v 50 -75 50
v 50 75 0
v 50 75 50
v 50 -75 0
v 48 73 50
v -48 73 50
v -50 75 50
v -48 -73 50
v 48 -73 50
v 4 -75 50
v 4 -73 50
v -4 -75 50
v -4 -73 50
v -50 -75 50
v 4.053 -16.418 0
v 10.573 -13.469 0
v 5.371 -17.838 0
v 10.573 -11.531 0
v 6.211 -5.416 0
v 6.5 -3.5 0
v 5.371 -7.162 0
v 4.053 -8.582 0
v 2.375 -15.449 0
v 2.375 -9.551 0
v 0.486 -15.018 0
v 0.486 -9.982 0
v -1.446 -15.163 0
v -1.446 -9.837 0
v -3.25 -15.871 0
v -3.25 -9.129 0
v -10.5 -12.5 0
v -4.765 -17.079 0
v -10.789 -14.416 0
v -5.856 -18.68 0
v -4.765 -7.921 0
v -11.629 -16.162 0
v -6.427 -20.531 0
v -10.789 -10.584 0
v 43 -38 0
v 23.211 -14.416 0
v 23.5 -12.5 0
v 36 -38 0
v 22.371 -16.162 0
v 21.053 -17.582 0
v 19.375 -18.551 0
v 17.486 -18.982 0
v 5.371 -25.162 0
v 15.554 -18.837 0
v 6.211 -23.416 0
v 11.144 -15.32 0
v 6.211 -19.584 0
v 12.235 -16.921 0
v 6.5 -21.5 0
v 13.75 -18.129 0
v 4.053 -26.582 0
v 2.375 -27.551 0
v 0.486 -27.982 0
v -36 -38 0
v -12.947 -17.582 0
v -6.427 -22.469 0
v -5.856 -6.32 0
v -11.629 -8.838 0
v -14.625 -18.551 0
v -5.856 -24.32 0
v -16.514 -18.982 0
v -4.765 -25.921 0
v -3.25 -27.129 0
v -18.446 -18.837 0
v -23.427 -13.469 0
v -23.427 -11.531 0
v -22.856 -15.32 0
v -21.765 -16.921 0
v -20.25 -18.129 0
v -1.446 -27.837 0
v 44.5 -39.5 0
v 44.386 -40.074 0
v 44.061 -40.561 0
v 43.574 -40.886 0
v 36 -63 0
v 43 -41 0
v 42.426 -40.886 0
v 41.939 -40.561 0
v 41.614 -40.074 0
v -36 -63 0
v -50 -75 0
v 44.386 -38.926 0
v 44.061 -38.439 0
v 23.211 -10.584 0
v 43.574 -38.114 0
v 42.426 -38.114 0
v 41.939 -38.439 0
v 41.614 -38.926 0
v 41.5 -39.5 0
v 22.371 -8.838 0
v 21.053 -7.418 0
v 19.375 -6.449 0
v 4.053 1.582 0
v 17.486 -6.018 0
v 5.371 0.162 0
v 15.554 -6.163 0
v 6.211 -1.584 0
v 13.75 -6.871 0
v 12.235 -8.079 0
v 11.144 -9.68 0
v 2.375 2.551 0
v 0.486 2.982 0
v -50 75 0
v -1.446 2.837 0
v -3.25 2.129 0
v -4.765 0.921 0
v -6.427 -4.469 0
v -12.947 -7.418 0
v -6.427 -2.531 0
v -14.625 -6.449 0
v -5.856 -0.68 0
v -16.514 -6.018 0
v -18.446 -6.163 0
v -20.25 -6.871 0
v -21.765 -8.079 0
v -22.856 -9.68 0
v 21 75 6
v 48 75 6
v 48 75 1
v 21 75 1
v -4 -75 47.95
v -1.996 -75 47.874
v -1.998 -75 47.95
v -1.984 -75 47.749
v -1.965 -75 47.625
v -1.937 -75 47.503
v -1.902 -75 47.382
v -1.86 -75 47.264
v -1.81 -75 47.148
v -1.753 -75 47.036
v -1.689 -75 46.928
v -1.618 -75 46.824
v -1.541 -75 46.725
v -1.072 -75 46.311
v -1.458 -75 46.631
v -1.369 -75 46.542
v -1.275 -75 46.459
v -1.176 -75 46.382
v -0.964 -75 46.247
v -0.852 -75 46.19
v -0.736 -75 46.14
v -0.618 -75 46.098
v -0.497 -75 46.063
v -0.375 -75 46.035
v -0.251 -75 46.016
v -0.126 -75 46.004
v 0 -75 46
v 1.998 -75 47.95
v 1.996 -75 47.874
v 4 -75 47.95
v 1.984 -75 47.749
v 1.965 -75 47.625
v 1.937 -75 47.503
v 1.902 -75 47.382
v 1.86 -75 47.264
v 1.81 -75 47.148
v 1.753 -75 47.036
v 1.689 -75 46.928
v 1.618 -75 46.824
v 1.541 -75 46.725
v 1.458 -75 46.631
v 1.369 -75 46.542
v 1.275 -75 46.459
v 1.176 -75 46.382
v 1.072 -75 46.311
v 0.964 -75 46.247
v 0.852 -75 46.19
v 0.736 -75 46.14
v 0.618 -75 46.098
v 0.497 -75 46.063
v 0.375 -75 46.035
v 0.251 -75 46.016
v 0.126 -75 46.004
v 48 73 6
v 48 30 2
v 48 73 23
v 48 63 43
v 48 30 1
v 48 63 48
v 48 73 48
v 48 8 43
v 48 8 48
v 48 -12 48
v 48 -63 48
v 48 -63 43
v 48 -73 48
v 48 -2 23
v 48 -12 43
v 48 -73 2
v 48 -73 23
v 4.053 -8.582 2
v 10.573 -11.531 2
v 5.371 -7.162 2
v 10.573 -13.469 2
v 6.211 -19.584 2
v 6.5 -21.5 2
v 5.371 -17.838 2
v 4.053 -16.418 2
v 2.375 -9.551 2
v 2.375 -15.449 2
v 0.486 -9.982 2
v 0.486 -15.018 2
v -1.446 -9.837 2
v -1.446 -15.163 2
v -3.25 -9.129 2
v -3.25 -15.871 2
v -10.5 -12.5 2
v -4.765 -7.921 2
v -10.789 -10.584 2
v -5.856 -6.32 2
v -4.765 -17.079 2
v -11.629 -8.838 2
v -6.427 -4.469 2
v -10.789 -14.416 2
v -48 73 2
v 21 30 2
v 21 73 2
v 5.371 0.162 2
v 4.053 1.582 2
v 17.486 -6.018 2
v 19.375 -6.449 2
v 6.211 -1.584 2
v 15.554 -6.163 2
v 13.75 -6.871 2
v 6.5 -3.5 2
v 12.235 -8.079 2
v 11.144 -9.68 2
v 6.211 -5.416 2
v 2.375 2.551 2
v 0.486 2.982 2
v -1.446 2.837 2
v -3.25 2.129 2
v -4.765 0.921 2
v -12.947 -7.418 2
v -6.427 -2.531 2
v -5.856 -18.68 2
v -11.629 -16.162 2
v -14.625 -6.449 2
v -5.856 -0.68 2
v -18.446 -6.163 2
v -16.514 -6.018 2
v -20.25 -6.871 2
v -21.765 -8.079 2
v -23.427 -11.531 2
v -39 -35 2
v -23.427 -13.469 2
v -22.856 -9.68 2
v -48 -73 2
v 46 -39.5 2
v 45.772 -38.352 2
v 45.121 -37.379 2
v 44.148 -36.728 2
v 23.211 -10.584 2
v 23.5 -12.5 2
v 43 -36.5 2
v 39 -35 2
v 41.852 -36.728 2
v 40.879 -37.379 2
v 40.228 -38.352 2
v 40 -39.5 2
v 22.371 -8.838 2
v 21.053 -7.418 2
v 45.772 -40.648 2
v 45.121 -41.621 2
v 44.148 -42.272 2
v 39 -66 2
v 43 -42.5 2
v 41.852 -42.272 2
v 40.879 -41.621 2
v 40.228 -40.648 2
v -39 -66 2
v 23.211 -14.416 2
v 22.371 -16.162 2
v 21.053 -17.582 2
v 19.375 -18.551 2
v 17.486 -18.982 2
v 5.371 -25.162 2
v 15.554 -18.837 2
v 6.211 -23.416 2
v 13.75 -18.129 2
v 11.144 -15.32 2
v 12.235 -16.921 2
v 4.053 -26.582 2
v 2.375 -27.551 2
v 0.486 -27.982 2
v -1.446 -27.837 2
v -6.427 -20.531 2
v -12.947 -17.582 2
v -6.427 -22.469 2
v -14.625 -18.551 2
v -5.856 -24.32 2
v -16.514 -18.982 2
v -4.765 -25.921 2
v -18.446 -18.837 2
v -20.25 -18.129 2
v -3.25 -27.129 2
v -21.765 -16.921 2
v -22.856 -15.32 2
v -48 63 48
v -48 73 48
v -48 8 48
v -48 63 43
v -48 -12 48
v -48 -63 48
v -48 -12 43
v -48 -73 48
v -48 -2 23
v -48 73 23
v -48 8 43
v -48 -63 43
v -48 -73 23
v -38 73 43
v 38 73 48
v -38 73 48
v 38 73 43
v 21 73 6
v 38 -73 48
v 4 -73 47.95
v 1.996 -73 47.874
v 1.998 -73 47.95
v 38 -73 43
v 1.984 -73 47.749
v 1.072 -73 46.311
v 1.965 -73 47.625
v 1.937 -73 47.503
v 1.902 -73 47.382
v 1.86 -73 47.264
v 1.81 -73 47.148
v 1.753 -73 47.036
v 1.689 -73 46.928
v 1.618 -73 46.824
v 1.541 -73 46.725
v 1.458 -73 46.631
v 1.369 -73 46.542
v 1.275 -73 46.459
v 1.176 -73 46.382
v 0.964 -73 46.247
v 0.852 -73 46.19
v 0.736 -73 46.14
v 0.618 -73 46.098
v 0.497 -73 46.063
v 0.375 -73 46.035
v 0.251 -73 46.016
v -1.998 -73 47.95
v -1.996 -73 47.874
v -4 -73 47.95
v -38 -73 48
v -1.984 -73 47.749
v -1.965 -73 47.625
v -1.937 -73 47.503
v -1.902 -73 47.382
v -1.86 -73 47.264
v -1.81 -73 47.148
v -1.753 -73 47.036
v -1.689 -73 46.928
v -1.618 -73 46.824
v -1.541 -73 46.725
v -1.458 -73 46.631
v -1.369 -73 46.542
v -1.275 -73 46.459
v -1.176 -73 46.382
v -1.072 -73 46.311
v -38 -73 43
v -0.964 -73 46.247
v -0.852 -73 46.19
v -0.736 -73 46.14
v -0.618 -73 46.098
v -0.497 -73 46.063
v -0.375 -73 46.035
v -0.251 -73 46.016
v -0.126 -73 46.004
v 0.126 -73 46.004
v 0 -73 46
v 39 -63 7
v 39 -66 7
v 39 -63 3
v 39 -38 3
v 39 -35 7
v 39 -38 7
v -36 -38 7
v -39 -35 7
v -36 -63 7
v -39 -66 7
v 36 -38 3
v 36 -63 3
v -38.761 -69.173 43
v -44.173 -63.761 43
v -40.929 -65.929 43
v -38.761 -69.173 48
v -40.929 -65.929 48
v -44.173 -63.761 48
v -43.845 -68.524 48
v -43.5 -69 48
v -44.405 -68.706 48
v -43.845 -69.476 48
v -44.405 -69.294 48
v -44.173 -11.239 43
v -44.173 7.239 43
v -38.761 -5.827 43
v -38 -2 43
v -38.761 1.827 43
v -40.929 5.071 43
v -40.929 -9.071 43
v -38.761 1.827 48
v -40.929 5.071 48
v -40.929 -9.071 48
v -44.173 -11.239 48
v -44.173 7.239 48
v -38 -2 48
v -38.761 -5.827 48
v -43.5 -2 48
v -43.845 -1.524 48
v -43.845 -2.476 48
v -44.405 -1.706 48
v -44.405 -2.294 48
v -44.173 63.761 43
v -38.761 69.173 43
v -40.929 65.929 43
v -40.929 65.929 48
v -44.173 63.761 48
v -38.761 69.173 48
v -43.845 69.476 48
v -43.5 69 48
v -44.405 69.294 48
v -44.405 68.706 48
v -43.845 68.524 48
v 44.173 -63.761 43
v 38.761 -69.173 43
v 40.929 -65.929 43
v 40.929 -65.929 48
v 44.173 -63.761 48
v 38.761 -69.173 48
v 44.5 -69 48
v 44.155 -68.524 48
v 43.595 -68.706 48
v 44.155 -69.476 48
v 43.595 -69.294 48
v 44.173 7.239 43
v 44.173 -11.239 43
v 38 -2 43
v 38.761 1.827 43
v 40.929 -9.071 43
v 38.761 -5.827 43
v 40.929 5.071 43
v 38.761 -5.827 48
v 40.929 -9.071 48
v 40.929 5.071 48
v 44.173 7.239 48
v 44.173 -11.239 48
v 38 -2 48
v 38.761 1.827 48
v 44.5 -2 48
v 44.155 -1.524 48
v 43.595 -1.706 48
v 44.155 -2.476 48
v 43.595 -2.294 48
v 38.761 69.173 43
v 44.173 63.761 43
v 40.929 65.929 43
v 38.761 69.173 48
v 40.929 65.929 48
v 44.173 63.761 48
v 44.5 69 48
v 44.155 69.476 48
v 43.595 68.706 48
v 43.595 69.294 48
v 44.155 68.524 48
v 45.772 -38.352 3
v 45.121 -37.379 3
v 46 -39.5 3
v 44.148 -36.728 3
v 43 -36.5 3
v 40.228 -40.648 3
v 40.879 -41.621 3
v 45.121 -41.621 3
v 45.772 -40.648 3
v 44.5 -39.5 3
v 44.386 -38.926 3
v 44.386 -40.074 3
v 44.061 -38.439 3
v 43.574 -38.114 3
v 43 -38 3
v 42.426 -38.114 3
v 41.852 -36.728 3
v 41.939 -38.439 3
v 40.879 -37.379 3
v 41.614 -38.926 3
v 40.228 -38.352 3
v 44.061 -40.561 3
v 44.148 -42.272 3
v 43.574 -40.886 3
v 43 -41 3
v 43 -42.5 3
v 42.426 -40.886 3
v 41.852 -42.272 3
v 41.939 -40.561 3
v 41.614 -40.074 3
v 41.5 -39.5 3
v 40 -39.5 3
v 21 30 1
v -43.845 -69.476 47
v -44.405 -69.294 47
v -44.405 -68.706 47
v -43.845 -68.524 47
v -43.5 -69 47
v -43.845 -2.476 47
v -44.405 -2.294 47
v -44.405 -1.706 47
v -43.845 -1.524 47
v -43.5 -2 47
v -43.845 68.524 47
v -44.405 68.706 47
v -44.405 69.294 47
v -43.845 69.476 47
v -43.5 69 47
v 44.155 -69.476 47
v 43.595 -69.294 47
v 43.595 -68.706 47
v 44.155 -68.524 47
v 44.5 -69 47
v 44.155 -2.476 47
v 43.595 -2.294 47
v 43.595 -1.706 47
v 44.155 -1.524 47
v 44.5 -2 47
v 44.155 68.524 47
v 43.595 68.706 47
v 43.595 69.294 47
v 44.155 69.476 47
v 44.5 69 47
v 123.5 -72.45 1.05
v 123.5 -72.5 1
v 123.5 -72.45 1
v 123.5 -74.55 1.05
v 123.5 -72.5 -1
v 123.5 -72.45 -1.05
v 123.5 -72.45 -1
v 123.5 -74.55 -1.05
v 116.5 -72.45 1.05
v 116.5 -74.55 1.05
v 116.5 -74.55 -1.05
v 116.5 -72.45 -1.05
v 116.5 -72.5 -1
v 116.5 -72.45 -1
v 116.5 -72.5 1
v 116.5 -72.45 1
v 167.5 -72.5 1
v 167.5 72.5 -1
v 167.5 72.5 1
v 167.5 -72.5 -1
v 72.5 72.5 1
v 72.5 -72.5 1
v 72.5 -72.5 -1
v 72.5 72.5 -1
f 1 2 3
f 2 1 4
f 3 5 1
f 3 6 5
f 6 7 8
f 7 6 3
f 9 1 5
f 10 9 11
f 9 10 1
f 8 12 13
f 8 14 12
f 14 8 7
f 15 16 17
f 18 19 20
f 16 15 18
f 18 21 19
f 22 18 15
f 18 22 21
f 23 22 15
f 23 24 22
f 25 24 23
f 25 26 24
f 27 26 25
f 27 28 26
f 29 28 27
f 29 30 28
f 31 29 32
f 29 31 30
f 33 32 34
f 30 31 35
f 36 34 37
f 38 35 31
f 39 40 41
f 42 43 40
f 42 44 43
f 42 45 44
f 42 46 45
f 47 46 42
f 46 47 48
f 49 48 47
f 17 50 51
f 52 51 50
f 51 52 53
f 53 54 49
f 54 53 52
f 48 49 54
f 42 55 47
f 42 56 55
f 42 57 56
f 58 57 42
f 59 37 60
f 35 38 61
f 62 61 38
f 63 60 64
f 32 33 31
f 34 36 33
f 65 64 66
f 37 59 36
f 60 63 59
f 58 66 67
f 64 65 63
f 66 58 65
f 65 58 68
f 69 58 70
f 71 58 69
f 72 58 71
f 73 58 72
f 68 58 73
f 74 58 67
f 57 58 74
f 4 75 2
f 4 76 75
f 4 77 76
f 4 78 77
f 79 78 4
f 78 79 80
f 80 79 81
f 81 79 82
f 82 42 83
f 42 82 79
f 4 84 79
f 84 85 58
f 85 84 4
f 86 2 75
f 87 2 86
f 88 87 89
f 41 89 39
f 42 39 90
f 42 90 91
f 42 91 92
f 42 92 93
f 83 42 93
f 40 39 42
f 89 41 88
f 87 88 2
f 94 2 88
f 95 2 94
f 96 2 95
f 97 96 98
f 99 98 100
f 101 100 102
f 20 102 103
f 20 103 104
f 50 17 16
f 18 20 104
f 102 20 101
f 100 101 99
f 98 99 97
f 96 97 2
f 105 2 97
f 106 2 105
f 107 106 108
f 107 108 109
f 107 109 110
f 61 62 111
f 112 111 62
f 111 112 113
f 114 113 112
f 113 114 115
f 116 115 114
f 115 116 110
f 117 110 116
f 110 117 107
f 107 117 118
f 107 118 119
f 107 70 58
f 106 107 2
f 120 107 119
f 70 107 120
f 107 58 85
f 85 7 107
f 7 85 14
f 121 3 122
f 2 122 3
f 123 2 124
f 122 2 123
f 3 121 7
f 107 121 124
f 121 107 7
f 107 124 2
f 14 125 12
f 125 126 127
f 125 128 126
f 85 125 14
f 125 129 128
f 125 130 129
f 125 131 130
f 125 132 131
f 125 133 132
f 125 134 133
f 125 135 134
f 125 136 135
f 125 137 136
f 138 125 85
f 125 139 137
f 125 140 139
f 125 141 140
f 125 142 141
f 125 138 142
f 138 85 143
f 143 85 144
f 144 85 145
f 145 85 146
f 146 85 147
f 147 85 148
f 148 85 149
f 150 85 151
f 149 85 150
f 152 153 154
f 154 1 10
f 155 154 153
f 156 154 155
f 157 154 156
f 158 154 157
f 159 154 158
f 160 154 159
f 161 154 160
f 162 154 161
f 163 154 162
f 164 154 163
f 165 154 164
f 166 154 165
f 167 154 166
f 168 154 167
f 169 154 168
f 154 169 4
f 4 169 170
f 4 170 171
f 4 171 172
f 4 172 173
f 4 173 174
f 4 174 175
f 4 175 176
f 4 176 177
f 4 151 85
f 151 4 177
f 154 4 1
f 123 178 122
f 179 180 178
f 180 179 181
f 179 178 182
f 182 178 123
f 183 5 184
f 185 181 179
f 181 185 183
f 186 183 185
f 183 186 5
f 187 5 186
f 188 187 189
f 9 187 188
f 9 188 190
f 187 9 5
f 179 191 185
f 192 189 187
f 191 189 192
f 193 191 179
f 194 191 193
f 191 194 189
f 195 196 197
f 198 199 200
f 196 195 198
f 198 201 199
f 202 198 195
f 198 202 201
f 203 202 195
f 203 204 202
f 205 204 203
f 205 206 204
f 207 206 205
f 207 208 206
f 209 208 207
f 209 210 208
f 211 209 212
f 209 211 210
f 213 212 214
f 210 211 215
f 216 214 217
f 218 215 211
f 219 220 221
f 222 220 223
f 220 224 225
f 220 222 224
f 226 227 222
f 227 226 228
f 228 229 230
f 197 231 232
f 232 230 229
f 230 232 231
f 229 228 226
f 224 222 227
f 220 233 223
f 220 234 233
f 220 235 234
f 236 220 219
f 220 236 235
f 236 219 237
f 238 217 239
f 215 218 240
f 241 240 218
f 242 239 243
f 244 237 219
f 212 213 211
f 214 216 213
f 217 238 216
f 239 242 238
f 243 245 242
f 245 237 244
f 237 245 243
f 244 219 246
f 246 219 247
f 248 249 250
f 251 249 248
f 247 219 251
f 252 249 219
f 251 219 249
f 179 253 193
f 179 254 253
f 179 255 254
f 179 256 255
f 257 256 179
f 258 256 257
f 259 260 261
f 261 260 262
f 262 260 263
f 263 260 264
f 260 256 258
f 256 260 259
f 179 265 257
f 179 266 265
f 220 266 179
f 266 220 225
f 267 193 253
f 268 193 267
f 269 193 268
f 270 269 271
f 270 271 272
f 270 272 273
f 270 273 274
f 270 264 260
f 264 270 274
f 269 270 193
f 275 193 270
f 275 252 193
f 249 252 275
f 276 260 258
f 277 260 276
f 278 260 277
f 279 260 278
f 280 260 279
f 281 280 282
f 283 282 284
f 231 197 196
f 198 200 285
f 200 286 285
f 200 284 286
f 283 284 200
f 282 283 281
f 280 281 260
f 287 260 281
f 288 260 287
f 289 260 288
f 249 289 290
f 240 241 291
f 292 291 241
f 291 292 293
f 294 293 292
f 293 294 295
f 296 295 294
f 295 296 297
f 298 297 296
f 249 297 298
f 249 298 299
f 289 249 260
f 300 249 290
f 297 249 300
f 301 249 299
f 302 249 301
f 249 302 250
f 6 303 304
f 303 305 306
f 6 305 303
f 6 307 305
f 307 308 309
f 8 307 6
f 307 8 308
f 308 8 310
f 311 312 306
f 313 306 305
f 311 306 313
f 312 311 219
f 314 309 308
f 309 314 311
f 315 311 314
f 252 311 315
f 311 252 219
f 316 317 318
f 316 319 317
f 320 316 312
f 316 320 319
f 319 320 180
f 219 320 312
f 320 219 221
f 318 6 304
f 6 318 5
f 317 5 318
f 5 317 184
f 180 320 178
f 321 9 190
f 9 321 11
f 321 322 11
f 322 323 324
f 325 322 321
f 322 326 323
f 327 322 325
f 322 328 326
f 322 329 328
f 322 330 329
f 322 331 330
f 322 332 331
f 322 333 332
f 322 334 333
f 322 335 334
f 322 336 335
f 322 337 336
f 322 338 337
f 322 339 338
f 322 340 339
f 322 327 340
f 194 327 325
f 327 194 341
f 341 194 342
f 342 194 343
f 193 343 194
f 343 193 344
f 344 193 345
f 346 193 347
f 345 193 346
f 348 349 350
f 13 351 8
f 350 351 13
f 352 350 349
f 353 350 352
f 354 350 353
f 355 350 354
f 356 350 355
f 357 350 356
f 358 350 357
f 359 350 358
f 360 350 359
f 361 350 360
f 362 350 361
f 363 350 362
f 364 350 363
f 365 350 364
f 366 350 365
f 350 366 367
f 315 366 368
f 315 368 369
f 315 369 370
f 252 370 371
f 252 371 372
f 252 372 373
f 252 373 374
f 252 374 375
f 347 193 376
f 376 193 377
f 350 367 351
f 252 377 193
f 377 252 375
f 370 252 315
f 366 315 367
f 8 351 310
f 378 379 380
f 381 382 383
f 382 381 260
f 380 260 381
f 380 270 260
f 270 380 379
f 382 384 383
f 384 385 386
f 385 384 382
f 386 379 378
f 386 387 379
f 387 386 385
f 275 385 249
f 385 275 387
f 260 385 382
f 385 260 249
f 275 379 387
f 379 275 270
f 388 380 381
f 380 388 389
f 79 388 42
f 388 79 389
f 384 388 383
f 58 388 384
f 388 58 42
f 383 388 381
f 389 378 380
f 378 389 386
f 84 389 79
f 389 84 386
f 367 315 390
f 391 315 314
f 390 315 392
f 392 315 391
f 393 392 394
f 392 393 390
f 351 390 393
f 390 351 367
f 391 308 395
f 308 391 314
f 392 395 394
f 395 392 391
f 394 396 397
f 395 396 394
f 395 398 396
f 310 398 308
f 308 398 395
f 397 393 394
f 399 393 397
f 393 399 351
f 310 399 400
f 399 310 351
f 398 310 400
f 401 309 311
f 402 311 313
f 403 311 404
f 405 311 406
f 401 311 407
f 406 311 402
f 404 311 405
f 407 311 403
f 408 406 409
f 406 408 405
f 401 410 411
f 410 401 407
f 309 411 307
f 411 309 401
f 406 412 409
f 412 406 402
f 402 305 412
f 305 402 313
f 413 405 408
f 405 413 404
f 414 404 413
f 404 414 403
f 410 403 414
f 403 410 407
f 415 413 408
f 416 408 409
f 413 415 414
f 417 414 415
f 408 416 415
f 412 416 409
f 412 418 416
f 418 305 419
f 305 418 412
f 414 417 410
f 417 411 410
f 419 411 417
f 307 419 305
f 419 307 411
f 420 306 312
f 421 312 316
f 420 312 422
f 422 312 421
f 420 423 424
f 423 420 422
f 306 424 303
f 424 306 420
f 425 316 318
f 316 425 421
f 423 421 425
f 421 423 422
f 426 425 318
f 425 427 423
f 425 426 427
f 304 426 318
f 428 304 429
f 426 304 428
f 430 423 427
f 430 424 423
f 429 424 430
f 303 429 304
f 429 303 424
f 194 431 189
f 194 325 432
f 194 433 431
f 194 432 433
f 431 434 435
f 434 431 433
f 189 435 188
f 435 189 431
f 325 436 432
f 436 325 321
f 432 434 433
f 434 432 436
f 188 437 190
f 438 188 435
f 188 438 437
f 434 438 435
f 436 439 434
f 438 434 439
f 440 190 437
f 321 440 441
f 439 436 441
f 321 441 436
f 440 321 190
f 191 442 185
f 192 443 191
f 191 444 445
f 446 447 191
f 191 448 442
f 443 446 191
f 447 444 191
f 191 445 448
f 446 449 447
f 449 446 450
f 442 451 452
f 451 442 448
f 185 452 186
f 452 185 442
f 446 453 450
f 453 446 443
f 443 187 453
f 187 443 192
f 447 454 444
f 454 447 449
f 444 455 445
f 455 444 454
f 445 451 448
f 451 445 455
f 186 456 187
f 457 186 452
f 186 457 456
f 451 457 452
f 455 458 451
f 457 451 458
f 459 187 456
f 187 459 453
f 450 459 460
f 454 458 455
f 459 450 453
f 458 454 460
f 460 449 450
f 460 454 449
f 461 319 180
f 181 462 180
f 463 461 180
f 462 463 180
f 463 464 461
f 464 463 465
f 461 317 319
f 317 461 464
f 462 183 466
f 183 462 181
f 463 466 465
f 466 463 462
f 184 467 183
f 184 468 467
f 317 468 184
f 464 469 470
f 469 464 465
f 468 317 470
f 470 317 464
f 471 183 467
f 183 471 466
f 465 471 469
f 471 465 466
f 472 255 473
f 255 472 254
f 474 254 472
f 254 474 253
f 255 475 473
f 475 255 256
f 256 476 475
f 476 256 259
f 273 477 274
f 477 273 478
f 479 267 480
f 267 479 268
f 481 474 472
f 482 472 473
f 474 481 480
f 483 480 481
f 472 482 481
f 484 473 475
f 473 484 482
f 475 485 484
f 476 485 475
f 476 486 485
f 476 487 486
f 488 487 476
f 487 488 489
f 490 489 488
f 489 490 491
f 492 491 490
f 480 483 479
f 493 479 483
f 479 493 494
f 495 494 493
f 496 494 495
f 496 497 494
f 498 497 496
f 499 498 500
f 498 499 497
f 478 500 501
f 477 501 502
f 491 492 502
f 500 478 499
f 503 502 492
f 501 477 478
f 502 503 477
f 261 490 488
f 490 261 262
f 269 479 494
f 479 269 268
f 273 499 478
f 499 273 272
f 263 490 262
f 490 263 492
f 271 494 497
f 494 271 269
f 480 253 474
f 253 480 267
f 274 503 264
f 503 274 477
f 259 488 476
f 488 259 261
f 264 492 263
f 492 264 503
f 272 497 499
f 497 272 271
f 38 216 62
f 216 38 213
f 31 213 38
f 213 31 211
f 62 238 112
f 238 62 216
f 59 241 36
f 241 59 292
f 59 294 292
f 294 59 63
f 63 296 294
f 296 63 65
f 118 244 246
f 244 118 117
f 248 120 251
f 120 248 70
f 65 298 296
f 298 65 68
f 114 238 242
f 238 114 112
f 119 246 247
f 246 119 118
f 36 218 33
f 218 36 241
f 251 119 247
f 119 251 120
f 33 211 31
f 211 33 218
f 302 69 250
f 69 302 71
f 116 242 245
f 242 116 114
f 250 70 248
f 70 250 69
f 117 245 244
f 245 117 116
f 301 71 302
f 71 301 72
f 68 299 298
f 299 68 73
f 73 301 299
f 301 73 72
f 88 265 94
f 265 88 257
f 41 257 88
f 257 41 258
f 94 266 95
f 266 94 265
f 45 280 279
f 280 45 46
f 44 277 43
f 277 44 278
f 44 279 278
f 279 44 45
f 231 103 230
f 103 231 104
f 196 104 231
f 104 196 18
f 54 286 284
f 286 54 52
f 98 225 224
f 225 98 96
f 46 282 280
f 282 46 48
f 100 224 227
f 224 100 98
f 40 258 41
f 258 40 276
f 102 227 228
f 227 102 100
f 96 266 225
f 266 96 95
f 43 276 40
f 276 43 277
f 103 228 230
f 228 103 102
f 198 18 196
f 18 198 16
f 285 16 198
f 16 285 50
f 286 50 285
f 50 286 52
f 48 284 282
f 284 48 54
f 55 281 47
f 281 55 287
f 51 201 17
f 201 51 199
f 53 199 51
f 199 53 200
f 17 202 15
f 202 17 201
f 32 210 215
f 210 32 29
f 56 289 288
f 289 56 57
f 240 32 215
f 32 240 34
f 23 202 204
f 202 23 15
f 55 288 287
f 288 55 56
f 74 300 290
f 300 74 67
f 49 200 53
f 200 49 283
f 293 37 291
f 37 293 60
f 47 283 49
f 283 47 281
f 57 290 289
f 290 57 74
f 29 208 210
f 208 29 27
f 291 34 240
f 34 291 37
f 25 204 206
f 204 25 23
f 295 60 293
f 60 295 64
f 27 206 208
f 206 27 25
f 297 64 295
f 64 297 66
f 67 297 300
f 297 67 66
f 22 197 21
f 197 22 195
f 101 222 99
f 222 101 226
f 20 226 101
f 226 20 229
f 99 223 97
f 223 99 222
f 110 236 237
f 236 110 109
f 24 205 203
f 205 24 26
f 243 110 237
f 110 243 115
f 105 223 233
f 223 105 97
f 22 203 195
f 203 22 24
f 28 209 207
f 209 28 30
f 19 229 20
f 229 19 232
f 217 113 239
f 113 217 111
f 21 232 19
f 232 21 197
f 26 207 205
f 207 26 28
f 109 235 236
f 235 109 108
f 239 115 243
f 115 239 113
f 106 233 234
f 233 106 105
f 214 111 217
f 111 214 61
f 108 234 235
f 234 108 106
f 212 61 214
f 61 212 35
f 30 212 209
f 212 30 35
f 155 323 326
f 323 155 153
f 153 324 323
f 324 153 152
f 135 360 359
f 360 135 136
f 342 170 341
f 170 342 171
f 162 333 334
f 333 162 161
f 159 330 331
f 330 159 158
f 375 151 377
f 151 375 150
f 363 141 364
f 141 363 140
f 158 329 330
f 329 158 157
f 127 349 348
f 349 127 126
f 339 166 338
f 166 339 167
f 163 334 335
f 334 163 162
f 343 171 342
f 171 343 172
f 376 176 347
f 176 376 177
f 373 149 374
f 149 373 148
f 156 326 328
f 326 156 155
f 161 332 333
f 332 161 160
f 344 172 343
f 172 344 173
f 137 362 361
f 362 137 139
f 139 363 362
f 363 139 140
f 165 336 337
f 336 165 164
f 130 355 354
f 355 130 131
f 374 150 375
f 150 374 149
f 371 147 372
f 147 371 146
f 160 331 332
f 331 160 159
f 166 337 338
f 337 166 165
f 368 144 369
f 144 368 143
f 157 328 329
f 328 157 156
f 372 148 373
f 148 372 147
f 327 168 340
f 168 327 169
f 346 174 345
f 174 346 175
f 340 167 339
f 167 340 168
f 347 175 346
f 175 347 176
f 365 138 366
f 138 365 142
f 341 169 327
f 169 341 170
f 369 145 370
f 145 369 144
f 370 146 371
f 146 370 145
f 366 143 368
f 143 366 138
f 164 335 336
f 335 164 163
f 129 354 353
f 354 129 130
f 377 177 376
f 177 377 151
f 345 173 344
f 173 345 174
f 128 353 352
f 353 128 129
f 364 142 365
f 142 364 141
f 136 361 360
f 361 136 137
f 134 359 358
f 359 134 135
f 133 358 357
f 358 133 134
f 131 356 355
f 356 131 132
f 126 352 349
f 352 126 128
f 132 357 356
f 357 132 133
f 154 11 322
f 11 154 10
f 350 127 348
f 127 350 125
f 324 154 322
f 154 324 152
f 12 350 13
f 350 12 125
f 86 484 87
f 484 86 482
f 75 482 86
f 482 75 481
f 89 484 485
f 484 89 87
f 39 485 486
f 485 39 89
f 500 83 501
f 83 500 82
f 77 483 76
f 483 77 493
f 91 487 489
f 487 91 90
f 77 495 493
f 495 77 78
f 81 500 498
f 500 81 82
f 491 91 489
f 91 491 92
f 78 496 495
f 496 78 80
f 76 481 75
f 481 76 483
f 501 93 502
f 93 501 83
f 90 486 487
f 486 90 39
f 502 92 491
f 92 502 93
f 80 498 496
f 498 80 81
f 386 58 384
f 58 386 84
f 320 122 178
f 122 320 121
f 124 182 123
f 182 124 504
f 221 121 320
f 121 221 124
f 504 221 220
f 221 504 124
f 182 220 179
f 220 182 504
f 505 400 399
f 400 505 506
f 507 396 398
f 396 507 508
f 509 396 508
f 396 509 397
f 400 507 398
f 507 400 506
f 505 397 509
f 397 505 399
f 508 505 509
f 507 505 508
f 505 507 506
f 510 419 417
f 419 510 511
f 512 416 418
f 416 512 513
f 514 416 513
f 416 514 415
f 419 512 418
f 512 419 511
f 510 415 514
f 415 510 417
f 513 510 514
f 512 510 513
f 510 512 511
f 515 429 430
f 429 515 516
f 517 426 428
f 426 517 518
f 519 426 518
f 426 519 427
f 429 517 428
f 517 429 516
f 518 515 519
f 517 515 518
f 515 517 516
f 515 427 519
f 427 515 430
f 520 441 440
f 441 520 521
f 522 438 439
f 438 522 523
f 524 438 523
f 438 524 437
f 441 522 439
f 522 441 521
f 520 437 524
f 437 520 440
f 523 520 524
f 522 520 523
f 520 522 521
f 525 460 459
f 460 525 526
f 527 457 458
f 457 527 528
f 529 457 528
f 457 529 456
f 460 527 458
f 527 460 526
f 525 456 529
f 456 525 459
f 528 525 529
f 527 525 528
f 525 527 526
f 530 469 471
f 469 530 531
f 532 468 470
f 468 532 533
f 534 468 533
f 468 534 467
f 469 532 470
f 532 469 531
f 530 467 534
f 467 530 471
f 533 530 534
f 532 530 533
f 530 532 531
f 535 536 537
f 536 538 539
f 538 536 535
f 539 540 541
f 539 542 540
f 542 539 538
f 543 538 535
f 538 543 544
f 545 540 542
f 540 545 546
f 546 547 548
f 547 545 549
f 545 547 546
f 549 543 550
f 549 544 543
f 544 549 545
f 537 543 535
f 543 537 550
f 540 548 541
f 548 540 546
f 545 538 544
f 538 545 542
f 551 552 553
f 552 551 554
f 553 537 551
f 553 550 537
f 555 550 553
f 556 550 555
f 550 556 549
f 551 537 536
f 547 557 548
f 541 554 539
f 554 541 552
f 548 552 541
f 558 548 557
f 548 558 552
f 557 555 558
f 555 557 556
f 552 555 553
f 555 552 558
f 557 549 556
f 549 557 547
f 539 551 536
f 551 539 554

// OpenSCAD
/*
 * Copyright (c) 2018 Andreas Signer <asigner@gmail.com>
 *
 * This file is part of kosmos_tape_emulator.
 *
 * kosmos_tape_emulator is free software: you can redistribute it and/or
 * modify it under the terms of the GNU General Public License as
 * published by the Free Software Foundation, either version 3 of the
 * License, or (at your option) any later version.
 *
 * kosmos_tape_emulator is distributed in the hope that it will be useful,
 * but WITHOUT ANY WARRANTY; without even the implied warranty of
 * MERCHANTABILITY or FITNESS FOR A PARTICULAR PURPOSE.  See the
 * GNU General Public License for more details.
 *
 * You should have received a copy of the GNU General Public License
 * along with kosmos_tape_tool.  If not, see <http://www.gnu.org/licenses/>.
 */

W = 100;
D = 85+65;
H = 50;

FRAGMENTS = 16;

WALL_WIDTH = 2;
FLOOR_HEIGHT = 2;

DISP_W = 72;
DISP_D = 25;

DISP_SUPPORT_WALL_W = 3;
DISP_SUPPORT_W = DISP_W + 2*DISP_SUPPORT_WALL_W;
DISP_SUPPORT_D = DISP_D + 2*DISP_SUPPORT_WALL_W;
DISP_SUPPORT_H = 7;

SD_CARD_W = 27;
SD_CARD_D = 45;
SD_CARD_H = 5;

INNER_W = W - 2*WALL_WIDTH;
INNER_D = D - 2*WALL_WIDTH;

SCREW_HOLE_OFFSET = 4;

module button_holes() {
    R = 6.5;
    translate([-17,0,0]) cylinder(r=R, h=2*H, center = true);
    translate([17,0,0]) cylinder(r=R, h=2*H, center = true);
    translate([0,-9,0]) cylinder(r=R, h=2*H, center = true);
    translate([0,9,0]) cylinder(r=R, h=2*H, center = true);
}

module display_support() {    
    translate([-DISP_SUPPORT_W/2,-DISP_SUPPORT_D/2,0]) {
        difference() {
            cube([DISP_SUPPORT_W, DISP_SUPPORT_D, DISP_SUPPORT_H]);        
            translate([DISP_W + DISP_SUPPORT_WALL_W, DISP_SUPPORT_WALL_W, DISP_SUPPORT_H-4]) {
                cube([DISP_SUPPORT_WALL_W, DISP_D, 4]);
            }        
        }    
    }
}

module display_hole() {
    cube([DISP_W,DISP_D, 2*H],true);
}

module sd_hole() {
    cube([SD_CARD_W, SD_CARD_D ,SD_CARD_H]);
}
    
module box() {
    translate([0,0,H/2])
    difference() {
        cube([W,D,H],true);
        translate([0,0,WALL_WIDTH]) cube([INNER_W,INNER_D,H],true);
    }
}

SUPPORT_R = 10;
SUPPORT_H1 = 5;
SUPPORT_H2 = 20;

module support_cylinder() {
    // Cylinder
    translate([0,0,-(SUPPORT_H1+SUPPORT_H2)]) cylinder(h=SUPPORT_H2, r1 = 0, r2 = SUPPORT_R, $fn=FRAGMENTS);
    translate([0,0,-SUPPORT_H1]) cylinder(h=SUPPORT_H1, r = SUPPORT_R, $fn=FRAGMENTS);
}

module support() {
    translate([0,0,H-FLOOR_HEIGHT]) difference() {
        support_cylinder();
        difference() {
            translate([-2*SUPPORT_R/2,-2*SUPPORT_R/2,-(SUPPORT_H1+SUPPORT_H2)]) cube([2*SUPPORT_R,2*SUPPORT_R,SUPPORT_H1+SUPPORT_H2]);
            translate([0,0,-(SUPPORT_H1+SUPPORT_H2)]) cube([2*SUPPORT_R/2,2*SUPPORT_R/2,SUPPORT_H1+SUPPORT_H2]);
        }
    }            
}

module support180() {
    translate([0,0,H-FLOOR_HEIGHT]) difference() {
        // Cylinder
        support_cylinder();
        translate([-2*SUPPORT_R/2,-2*SUPPORT_R/2,-(SUPPORT_H1+SUPPORT_H2)]) cube([2*SUPPORT_R,SUPPORT_R,SUPPORT_H1+SUPPORT_H2]);
    }            
}

module led() {
    translate([0,0,1.5]) cylinder(h=3, r = 3, $fn=FRAGMENTS, center = true);
}

module led_hole() {
    translate([0,0,1.5]) cylinder(h=3, r = 1.5, $fn=FRAGMENTS, center = true);
}

module cable_hole() {
    rotate([180,0,0])
    translate([0,-WALL_WIDTH/2,WALL_WIDTH/2]) {
        translate([0,0,WALL_WIDTH/2]) rotate([90,0,0]) cylinder(r=2,h=4, $fn=100, center=true);
        cube([8,WALL_WIDTH+.1,WALL_WIDTH+.1], center=true);
    }
}

module ground_plate() {
    difference() {
        group() {
            SHRINK = 1;
            W = INNER_W-SHRINK;
            D = INNER_D-SHRINK;
            translate([0,-(D+WALL_WIDTH)/2,0]) cube([7,WALL_WIDTH+.1,WALL_WIDTH+.1], center=true);
            cube([W, D, WALL_WIDTH],center=true);
        }
        //translate([-W/2+SCREW_HOLE_OFFSET, -D/2+SCREW_HOLE_OFFSET,0]) cylinder(r=.751,h=WALL_WIDTH,center=true, $fn=100);
        //translate([-W/2+SCREW_HOLE_OFFSET,  0-SCREW_HOLE_OFFSET/2,0]) cylinder(r=.75,h=WALL_WIDTH,center=true, $fn=100);
        //translate([-W/2+SCREW_HOLE_OFFSET,  D/2-SCREW_HOLE_OFFSET,0]) cylinder(r=.75,h=WALL_WIDTH,center=true, $fn=100);
        //translate([ W/2-SCREW_HOLE_OFFSET, -D/2+SCREW_HOLE_OFFSET,0]) cylinder(r=.75,h=WALL_WIDTH,center=true, $fn=100);
        //translate([ W/2-SCREW_HOLE_OFFSET,  0-SCREW_HOLE_OFFSET/2,0]) cylinder(r=.75,h=WALL_WIDTH,center=true, $fn=100);
        //translate([ W/2-SCREW_HOLE_OFFSET,  D/2-SCREW_HOLE_OFFSET,0]) cylinder(r=.75,h=WALL_WIDTH,center=true, $fn=100);
    }
}
    
module case() {
    difference() {
        group() {
            box();
            translate([W/2-7,-7-65/2, 0]) led();
            translate([0,-18-65/2,0]) display_support();
            
            translate([-W/2+WALL_WIDTH, -D/2 + WALL_WIDTH, 0]) support();
            translate([-W/2+WALL_WIDTH,  0 - WALL_WIDTH, 0]) rotate([0,0,270]) support180();
            translate([-W/2+WALL_WIDTH,  D/2 - WALL_WIDTH, 0]) rotate([0,0,270]) support();
            translate([ W/2-WALL_WIDTH, -D/2 + WALL_WIDTH, 0]) rotate([0,0,90]) support();
            translate([ W/2-WALL_WIDTH,  0 - WALL_WIDTH, 0]) rotate([0,0,90]) support180();
            translate([ W/2-WALL_WIDTH,  D/2 - WALL_WIDTH, 0]) rotate([0,0,180]) support();

        };
    
        translate([W/2-7,-7-65/2,0]) led_hole();
        translate([0,20-65/2,0]) button_holes();            
        translate([0,-18-65/2,0]) display_hole();
        translate([INNER_W/2-SD_CARD_W,INNER_D/2-SD_CARD_D+WALL_WIDTH,1]) sd_hole();            
        translate([0,-D/2,H]) cable_hole();
        translate([-INNER_W/2+SCREW_HOLE_OFFSET, -INNER_D/2+SCREW_HOLE_OFFSET,H-WALL_WIDTH]) cylinder(r=.5,h=WALL_WIDTH,center=true);
        translate([-INNER_W/2+SCREW_HOLE_OFFSET,  0-SCREW_HOLE_OFFSET/2,H-WALL_WIDTH]) cylinder(r=.5,h=WALL_WIDTH,center=true);
        translate([-INNER_W/2+SCREW_HOLE_OFFSET,  INNER_D/2-SCREW_HOLE_OFFSET,H-WALL_WIDTH]) cylinder(r=.5,h=WALL_WIDTH,center=true);

        translate([ INNER_W/2-SCREW_HOLE_OFFSET, -INNER_D/2+SCREW_HOLE_OFFSET,H-WALL_WIDTH]) cylinder(r=.5,h=WALL_WIDTH,center=true);
        translate([ INNER_W/2-SCREW_HOLE_OFFSET,  0-SCREW_HOLE_OFFSET/2,H-WALL_WIDTH]) cylinder(r=.5,h=WALL_WIDTH,center=true);
        translate([ INNER_W/2-SCREW_HOLE_OFFSET,  INNER_D/2-SCREW_HOLE_OFFSET,H-WALL_WIDTH]) cylinder(r=.5,h=WALL_WIDTH,center=true);
    }
}


case();
translate([W+20,0,0]) 
ground_plate();

 
